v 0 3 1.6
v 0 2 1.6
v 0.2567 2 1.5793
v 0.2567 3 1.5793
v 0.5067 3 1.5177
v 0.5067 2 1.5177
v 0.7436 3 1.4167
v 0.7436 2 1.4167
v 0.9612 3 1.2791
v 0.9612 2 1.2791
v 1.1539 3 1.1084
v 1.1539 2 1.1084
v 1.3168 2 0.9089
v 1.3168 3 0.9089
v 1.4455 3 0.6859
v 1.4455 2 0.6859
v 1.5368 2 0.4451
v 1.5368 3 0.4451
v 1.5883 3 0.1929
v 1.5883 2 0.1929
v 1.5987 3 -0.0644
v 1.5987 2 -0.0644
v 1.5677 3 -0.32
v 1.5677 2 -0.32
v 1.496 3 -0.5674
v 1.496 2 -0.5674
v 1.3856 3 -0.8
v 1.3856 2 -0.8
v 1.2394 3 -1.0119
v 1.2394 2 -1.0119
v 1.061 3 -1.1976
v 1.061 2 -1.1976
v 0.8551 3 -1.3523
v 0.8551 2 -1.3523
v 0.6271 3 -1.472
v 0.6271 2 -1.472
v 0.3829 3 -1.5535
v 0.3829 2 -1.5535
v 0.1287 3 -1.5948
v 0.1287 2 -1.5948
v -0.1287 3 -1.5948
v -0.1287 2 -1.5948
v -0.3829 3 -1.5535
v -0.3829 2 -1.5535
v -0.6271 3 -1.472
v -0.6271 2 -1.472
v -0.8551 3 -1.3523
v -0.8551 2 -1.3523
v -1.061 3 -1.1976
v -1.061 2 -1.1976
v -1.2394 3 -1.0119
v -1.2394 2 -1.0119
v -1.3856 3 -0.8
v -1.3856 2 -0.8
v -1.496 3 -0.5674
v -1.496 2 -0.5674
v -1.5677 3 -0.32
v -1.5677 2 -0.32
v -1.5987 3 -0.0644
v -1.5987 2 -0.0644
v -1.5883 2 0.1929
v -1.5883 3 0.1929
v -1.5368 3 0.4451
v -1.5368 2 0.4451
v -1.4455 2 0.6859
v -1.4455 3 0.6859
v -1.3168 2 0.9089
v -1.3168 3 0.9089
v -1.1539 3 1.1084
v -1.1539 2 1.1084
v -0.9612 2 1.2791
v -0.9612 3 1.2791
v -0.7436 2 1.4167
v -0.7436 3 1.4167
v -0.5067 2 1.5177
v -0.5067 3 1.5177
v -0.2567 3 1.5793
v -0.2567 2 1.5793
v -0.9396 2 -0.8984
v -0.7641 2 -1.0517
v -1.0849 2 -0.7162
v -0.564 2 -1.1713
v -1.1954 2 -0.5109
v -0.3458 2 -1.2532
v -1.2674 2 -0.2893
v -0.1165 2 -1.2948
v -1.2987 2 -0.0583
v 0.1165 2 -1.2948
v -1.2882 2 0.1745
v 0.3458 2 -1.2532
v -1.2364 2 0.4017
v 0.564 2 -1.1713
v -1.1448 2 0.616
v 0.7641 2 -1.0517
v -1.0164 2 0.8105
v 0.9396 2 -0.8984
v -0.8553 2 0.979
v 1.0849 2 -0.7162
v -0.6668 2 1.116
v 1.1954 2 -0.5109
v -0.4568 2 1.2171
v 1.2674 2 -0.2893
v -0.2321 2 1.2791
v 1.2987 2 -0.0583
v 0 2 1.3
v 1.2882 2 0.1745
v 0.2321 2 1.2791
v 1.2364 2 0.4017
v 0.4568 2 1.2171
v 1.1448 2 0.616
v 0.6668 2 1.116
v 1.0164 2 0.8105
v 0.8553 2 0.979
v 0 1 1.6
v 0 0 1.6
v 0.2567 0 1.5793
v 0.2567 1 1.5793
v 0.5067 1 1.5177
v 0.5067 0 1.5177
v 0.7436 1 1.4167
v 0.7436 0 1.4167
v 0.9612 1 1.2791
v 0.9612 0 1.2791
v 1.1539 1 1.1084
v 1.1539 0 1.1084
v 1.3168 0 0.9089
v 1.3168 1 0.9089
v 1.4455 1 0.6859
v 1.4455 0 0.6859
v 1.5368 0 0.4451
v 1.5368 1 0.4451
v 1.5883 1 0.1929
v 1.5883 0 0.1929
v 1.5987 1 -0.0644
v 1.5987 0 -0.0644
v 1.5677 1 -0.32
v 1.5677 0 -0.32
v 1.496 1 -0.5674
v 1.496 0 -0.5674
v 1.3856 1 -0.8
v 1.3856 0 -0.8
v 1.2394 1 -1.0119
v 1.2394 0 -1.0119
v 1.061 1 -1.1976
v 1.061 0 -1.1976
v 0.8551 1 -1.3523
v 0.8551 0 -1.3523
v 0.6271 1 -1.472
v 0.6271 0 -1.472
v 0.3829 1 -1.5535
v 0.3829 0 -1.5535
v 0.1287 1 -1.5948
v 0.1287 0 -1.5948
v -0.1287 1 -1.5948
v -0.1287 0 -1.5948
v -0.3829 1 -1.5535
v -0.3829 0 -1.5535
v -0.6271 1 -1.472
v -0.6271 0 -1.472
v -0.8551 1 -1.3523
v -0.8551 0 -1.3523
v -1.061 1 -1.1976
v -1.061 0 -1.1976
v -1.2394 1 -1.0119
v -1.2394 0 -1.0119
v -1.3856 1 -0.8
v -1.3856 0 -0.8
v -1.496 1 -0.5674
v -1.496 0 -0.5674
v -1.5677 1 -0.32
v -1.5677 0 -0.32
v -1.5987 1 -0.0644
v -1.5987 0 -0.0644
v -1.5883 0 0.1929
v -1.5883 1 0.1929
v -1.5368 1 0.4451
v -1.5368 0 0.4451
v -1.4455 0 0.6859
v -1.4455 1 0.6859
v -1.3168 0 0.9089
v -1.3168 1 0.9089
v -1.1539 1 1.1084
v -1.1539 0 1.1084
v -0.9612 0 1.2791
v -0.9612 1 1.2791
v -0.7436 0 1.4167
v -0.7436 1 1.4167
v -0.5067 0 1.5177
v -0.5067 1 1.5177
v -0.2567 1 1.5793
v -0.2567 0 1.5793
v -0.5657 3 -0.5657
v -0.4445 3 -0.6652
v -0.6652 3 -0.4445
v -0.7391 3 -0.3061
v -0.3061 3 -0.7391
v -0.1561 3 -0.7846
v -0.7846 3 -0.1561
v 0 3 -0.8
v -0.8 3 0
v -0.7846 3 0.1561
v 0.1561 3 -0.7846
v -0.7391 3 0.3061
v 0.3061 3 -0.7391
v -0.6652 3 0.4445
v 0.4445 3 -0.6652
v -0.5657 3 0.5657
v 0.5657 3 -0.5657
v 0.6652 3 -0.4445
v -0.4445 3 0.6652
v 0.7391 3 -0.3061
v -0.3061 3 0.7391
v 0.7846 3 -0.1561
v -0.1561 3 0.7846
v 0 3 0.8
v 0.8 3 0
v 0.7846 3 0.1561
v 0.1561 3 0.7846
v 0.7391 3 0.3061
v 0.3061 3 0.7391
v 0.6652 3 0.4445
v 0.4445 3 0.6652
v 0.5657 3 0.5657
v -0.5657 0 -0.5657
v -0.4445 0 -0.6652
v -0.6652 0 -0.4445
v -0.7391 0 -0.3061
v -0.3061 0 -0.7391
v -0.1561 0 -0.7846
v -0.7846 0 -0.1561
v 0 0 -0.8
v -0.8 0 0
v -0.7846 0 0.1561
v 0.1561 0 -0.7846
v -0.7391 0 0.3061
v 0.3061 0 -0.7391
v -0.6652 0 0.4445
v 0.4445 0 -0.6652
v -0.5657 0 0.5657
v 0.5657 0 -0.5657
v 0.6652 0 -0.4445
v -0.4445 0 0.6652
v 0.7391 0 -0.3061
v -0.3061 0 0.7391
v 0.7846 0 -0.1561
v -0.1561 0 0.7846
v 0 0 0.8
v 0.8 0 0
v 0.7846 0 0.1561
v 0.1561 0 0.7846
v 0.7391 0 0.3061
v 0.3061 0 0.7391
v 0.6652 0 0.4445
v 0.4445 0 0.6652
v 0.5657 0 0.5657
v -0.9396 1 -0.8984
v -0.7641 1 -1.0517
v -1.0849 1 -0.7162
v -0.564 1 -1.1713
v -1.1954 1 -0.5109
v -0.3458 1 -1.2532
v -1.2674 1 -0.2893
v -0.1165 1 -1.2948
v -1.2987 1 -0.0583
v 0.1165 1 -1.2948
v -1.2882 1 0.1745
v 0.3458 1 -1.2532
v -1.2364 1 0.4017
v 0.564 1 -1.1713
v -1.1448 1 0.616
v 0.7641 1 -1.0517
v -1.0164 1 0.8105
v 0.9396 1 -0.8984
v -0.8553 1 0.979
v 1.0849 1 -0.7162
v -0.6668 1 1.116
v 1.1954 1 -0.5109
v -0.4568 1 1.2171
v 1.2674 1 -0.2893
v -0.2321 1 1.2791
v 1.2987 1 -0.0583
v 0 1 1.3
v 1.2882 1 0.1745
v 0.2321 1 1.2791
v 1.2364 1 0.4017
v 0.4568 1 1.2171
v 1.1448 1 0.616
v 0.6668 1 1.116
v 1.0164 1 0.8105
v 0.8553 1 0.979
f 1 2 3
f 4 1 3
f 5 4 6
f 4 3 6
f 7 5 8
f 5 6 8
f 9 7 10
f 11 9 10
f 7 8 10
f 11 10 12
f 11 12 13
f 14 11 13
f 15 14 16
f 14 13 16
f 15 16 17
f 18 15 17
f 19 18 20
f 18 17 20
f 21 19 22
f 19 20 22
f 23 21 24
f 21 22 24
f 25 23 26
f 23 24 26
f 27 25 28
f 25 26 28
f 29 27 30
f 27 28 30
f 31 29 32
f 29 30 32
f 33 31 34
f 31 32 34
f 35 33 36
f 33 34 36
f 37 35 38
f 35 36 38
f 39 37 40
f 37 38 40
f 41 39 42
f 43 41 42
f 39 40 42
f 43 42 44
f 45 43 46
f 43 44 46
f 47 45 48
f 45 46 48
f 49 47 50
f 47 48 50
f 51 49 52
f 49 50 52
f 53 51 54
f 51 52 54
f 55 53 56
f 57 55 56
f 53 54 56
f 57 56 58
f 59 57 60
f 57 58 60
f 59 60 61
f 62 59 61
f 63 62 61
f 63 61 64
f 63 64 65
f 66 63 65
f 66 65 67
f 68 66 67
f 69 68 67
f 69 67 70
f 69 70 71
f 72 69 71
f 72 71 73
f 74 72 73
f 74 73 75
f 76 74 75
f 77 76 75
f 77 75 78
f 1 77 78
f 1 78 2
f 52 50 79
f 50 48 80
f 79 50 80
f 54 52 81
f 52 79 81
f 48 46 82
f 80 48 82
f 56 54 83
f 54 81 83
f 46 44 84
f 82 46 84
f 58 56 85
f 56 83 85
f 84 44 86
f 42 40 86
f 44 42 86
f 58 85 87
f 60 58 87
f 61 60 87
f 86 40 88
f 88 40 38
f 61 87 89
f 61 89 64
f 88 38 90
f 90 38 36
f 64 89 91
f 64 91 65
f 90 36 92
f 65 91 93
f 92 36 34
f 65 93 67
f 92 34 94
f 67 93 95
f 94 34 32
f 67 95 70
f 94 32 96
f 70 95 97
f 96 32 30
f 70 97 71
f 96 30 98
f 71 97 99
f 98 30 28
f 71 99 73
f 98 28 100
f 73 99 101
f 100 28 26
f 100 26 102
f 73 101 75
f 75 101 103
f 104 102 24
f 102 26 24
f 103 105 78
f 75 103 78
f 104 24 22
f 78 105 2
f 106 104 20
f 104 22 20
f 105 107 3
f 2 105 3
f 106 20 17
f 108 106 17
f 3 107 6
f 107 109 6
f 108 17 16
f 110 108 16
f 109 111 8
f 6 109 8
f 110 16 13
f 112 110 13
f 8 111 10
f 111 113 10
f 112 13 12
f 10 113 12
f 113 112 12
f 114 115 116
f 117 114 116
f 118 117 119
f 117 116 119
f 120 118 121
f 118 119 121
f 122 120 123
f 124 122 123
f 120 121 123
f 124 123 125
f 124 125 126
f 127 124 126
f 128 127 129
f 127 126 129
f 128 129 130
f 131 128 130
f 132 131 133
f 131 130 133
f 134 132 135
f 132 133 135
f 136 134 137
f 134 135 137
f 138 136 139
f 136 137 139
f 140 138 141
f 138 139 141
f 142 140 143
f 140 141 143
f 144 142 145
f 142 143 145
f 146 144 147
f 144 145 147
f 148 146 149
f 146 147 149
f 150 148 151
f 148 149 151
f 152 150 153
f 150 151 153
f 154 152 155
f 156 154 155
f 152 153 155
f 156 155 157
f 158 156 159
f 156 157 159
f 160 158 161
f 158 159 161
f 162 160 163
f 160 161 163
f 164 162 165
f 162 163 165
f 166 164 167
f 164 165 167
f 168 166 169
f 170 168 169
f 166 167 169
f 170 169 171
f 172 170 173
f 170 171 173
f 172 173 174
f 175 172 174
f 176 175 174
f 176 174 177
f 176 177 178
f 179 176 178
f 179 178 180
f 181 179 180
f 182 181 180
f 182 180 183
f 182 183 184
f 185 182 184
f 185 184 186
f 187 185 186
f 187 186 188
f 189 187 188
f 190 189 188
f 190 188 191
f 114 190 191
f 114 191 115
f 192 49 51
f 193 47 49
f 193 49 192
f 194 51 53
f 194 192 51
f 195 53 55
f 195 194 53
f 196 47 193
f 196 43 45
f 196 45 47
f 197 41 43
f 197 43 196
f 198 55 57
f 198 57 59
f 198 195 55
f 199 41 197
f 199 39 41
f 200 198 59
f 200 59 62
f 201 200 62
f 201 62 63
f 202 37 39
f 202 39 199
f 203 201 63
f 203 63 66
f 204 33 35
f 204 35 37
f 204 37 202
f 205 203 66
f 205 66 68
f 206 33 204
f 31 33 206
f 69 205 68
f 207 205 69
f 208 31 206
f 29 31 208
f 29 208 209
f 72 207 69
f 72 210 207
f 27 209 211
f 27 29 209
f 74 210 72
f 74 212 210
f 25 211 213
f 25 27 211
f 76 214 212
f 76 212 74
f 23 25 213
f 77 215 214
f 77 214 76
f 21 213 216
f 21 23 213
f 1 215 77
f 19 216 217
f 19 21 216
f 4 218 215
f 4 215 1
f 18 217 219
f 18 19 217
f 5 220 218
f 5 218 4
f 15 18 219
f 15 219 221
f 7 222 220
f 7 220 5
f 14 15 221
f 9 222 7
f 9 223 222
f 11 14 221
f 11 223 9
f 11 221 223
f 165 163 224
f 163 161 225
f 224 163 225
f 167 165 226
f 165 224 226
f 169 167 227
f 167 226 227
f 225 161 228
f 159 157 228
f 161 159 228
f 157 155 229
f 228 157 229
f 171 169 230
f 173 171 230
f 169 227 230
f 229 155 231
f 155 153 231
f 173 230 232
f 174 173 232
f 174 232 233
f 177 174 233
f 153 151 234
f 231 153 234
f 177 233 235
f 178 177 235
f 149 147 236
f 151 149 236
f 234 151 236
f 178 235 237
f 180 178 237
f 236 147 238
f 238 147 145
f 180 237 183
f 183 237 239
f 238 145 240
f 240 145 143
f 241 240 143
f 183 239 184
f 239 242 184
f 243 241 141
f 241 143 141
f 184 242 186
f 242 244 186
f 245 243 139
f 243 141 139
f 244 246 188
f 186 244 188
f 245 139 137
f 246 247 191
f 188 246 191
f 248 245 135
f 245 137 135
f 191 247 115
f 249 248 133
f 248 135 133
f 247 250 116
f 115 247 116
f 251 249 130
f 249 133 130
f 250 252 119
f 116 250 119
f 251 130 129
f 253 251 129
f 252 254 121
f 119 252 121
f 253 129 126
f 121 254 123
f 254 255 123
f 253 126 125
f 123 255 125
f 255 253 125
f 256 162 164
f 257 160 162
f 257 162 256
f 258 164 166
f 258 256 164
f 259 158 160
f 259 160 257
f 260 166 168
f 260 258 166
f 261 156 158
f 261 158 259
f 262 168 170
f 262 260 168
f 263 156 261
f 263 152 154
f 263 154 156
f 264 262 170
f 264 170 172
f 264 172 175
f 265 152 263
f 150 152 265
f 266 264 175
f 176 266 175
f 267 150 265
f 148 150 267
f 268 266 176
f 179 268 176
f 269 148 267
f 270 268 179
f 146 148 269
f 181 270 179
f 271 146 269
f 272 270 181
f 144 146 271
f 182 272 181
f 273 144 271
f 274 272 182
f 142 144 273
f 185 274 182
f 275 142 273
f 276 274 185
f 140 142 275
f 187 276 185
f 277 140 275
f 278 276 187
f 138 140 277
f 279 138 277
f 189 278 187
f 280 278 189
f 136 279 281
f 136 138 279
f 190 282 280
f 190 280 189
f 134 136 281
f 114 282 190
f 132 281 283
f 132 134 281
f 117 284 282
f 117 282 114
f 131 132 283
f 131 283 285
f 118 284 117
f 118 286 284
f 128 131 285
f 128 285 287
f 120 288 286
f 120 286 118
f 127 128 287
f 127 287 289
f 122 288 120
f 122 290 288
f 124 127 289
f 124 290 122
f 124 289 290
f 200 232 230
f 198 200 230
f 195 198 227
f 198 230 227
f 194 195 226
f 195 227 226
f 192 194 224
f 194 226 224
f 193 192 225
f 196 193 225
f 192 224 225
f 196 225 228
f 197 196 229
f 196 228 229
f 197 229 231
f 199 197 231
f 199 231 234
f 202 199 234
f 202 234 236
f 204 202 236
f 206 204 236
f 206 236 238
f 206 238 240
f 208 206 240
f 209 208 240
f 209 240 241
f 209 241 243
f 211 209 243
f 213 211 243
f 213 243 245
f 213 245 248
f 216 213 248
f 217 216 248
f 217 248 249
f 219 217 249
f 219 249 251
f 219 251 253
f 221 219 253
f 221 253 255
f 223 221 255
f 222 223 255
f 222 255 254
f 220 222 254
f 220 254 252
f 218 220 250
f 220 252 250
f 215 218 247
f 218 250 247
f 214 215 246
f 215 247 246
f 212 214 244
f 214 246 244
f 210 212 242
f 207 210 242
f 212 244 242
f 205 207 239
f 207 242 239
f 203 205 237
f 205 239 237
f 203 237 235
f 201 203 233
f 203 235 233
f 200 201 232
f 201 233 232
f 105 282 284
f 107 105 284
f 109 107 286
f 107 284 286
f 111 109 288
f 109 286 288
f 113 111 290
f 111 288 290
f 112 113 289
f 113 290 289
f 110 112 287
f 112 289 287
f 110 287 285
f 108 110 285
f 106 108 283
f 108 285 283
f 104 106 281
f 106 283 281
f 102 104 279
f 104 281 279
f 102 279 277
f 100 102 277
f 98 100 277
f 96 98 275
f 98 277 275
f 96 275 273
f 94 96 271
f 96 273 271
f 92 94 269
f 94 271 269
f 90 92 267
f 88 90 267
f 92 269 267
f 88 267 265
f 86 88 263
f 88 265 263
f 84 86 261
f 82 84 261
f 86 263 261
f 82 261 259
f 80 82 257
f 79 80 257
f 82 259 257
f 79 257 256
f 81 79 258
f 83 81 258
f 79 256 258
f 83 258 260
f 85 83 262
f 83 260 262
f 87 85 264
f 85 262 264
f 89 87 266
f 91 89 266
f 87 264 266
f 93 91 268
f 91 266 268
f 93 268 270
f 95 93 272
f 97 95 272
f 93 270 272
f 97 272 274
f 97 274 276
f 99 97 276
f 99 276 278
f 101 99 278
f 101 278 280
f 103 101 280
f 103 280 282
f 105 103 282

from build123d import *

# Parameters (mm, degrees)
SKETCH_1_R         = 1.6
EXTRUDE_1_DEPTH    = 1
SKETCH_2_R         = 1.3
EXTRUDE_2_DEPTH    = 1
SKETCH_3_R         = 1.6
EXTRUDE_3_DEPTH    = 1
HOLE_WIZARD_M2_1_D = 1.6


with BuildPart() as part:
    # 草图1 → 凸台-拉伸1 (new body)
    with BuildSketch(Plane(origin=(0, 0, 0), x_dir=(1, 0, 0), z_dir=(0, 1, 0))):
        with Locations(Location((0, 0, 0), (0, 0, 270))):
            Circle(SKETCH_1_R)
    extrude(amount=EXTRUDE_1_DEPTH)

    # 草图2 → 凸台-拉伸2 (add)
    with BuildSketch(Plane(origin=(0, 1, 0), x_dir=(1, 0, 0), z_dir=(0, 1, 0))):
        with Locations(Location((0, 0, 0), (0, 0, 270))):
            Circle(SKETCH_2_R)
    extrude(amount=EXTRUDE_2_DEPTH)

    # 草图3 → 凸台-拉伸3 (add)
    with BuildSketch(Plane(origin=(0, 2, 0), x_dir=(1, 0, 0), z_dir=(0, 1, 0))):
        with Locations(Location((0, 0, 0), (0, 0, 270))):
            Circle(SKETCH_3_R)
    extrude(amount=EXTRUDE_3_DEPTH)

    # M2 螺纹孔1 (through all)
    with Locations(Plane(origin=(0, 3, 0), x_dir=(1, 0, 0), z_dir=(0, 1, 0))):
        with Locations((0, 0)):
            Hole(HOLE_WIZARD_M2_1_D / 2)


solid = part.part
